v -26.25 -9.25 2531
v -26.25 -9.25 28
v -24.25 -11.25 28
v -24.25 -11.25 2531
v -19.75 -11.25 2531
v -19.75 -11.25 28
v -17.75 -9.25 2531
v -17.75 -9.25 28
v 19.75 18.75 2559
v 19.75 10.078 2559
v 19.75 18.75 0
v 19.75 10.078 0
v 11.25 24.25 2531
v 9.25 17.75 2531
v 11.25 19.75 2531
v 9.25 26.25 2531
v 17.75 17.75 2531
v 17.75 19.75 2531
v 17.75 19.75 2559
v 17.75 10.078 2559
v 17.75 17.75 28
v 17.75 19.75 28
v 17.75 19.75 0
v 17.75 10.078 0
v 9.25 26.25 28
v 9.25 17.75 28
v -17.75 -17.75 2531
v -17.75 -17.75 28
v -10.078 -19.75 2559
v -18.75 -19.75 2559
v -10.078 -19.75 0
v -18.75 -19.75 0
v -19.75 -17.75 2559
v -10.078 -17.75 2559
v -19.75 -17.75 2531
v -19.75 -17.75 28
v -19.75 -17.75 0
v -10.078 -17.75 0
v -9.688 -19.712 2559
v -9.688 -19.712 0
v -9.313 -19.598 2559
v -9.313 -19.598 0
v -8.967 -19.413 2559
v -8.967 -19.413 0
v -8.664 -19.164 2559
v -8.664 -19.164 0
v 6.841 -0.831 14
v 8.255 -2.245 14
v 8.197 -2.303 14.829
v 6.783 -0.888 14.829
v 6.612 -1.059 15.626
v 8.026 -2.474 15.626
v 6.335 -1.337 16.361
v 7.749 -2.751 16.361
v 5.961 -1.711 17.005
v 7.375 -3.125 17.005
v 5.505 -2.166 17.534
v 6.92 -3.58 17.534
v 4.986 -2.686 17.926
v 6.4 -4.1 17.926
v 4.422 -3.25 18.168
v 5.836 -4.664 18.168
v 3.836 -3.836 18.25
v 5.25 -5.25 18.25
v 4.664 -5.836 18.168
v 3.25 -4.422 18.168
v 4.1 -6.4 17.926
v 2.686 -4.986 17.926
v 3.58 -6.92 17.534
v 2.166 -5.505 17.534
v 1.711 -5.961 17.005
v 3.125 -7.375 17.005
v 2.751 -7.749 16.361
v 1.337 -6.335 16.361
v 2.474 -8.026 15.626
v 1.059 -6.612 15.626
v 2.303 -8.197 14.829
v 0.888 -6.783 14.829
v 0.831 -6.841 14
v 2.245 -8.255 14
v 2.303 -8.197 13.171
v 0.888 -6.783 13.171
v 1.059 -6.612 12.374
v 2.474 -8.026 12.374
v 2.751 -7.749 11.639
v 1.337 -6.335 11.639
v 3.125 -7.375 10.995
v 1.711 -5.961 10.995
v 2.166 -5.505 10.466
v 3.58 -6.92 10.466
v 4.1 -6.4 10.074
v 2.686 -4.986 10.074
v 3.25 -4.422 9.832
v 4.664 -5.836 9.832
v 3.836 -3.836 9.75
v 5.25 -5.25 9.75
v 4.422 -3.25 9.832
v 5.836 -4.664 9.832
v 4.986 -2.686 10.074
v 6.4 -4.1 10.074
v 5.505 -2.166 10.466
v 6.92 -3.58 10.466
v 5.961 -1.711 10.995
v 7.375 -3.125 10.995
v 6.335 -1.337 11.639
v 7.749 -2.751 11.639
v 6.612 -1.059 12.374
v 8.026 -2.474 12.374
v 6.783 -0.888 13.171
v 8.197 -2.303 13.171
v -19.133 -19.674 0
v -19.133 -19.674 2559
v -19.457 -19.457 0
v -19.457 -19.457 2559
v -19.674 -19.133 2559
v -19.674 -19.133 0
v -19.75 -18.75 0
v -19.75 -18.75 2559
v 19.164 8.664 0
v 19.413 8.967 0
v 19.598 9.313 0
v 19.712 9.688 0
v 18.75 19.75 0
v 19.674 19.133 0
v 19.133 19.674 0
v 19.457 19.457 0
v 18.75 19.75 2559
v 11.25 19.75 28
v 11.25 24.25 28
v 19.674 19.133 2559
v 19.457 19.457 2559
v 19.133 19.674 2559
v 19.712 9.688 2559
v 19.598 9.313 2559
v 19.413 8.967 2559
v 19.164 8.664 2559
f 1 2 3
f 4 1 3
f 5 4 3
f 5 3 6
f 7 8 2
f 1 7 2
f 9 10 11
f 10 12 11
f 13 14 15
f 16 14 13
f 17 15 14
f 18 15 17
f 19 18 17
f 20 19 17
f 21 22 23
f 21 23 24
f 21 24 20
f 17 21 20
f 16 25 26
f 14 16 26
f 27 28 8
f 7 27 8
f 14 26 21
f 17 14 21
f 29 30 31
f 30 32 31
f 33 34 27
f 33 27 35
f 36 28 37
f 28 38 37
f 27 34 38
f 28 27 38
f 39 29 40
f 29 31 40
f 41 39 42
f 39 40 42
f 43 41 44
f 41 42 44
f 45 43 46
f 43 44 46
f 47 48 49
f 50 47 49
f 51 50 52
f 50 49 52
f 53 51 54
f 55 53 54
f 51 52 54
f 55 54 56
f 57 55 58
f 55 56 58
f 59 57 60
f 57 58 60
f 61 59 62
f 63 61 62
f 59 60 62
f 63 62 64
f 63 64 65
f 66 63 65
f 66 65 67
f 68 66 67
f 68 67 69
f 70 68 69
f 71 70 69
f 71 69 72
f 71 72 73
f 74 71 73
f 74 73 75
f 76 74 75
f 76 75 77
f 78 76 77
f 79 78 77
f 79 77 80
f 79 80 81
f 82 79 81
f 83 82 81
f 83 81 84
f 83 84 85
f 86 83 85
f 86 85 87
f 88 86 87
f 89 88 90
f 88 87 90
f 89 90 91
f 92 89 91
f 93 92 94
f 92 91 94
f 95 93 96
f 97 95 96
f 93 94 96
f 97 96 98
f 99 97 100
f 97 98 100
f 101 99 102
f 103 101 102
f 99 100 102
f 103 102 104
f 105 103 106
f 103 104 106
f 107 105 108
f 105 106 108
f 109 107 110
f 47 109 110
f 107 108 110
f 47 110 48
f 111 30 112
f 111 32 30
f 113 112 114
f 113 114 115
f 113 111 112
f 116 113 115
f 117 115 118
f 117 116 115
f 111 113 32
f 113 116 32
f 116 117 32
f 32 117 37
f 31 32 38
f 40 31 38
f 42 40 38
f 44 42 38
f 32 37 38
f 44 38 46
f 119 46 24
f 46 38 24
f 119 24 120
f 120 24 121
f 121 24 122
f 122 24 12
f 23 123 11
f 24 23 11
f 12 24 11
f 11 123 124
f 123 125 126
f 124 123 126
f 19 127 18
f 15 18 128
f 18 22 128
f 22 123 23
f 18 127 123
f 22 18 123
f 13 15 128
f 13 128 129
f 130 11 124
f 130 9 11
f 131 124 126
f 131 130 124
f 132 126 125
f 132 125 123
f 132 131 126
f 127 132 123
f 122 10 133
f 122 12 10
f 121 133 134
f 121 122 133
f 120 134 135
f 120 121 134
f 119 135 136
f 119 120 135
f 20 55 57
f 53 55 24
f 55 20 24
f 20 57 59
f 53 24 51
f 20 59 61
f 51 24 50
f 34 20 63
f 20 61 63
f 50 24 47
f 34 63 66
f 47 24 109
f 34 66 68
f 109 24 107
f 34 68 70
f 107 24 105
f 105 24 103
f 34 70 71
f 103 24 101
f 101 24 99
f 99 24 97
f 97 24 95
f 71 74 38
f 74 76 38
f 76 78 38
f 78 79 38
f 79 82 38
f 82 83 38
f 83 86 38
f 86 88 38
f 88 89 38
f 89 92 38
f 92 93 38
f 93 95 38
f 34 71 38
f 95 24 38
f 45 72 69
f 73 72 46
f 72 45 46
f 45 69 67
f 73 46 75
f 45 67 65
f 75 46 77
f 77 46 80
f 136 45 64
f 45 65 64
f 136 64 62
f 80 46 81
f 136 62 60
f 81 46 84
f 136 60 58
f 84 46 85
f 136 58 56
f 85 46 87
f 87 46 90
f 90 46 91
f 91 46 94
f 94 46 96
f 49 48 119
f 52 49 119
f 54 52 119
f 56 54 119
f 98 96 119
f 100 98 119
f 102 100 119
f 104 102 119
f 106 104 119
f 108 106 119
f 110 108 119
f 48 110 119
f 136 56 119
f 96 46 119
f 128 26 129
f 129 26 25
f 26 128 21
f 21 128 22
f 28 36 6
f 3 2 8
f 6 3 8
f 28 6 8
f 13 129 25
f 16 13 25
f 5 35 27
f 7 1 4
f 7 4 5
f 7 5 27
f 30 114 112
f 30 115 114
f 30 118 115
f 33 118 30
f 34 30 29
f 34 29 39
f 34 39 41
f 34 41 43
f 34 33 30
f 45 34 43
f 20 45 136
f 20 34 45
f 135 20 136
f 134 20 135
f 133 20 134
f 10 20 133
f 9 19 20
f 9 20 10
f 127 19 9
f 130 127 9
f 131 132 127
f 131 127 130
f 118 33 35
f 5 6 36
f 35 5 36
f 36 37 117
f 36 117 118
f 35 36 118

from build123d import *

# Parameters (mm, degrees)
F1_DEPTH = 28
F3_DEPTH = 2503
F5_DEPTH = 28
F6_R     = 2
F7_R     = 1
F8_R     = 4.25
F9_DEPTH = 25


with BuildPart() as f1:
    # F0 (on Top) → F1 (new body)
    with BuildSketch(Plane.XY):
        Polygon((-19.75, -17.750001), (-19.75, -19.75), (-9.25, -19.75), (19.75, 9.25), (19.75, 19.75), (17.750001, 19.75), (17.750001, 10.078427), (-10.078427, -17.750001), align=None)
    extrude(amount=F1_DEPTH)

    # F2 (on face) → F3 (join)
    with BuildSketch(Plane.XY.offset(28)):
        Polygon((-19.75, -19.75), (-9.25, -19.75), (19.75, 9.25), (19.75, 19.75), (11.25, 19.75), (11.25, 24.25), (9.25, 26.25), (9.25, 23.421573), (9.25, 19.75), (9.25, 17.750001), (17.750001, 17.750001), (17.750001, 10.078427), (16.585787, 8.914213), (-8.914213, -16.585787), (-10.078427, -17.750001), (-17.750001, -17.750001), (-17.750001, -9.25), (-19.75, -9.25), (-23.421573, -9.25), (-26.25, -9.25), (-24.25, -11.25), (-19.75, -11.25), align=None)
    extrude(amount=F3_DEPTH)

    # F4 (on face) → F5 (join)
    with BuildSketch(Plane.XY.offset(2531)):
        Polygon((19.75, 9.25), (19.75, 19.75), (17.750001, 19.75), (17.750001, 10.078427), (-10.078427, -17.750001), (-19.75, -17.750001), (-19.75, -19.75), (-9.25, -19.75), align=None)
    extrude(amount=F5_DEPTH)

    # F6
    f6_edges = [f1.edges().sort_by_distance(p)[0] for p in [
        (19.75, 9.25, 1279.5),
        (-9.25, -19.75, 1279.5),
    ]]
    fillet(f6_edges, radius=F6_R)

    # F7
    f7_edges = [f1.edges().sort_by_distance(p)[0] for p in [
        (-19.75, -19.75, 1279.5),
        (19.75, 19.75, 1279.5),
    ]]
    fillet(f7_edges, radius=F7_R)

    # F8 (on face) → F9 (cut)
    with BuildSketch(Plane(origin=(5.25, -5.25, 0), x_dir=(0.707107, 0.707107, 0), z_dir=(0.707107, -0.707107, 0))):
        with Locations((0, 14)):
            Circle(F8_R)
    extrude(amount=-F9_DEPTH, mode=Mode.SUBTRACT)


solid = f1.part
